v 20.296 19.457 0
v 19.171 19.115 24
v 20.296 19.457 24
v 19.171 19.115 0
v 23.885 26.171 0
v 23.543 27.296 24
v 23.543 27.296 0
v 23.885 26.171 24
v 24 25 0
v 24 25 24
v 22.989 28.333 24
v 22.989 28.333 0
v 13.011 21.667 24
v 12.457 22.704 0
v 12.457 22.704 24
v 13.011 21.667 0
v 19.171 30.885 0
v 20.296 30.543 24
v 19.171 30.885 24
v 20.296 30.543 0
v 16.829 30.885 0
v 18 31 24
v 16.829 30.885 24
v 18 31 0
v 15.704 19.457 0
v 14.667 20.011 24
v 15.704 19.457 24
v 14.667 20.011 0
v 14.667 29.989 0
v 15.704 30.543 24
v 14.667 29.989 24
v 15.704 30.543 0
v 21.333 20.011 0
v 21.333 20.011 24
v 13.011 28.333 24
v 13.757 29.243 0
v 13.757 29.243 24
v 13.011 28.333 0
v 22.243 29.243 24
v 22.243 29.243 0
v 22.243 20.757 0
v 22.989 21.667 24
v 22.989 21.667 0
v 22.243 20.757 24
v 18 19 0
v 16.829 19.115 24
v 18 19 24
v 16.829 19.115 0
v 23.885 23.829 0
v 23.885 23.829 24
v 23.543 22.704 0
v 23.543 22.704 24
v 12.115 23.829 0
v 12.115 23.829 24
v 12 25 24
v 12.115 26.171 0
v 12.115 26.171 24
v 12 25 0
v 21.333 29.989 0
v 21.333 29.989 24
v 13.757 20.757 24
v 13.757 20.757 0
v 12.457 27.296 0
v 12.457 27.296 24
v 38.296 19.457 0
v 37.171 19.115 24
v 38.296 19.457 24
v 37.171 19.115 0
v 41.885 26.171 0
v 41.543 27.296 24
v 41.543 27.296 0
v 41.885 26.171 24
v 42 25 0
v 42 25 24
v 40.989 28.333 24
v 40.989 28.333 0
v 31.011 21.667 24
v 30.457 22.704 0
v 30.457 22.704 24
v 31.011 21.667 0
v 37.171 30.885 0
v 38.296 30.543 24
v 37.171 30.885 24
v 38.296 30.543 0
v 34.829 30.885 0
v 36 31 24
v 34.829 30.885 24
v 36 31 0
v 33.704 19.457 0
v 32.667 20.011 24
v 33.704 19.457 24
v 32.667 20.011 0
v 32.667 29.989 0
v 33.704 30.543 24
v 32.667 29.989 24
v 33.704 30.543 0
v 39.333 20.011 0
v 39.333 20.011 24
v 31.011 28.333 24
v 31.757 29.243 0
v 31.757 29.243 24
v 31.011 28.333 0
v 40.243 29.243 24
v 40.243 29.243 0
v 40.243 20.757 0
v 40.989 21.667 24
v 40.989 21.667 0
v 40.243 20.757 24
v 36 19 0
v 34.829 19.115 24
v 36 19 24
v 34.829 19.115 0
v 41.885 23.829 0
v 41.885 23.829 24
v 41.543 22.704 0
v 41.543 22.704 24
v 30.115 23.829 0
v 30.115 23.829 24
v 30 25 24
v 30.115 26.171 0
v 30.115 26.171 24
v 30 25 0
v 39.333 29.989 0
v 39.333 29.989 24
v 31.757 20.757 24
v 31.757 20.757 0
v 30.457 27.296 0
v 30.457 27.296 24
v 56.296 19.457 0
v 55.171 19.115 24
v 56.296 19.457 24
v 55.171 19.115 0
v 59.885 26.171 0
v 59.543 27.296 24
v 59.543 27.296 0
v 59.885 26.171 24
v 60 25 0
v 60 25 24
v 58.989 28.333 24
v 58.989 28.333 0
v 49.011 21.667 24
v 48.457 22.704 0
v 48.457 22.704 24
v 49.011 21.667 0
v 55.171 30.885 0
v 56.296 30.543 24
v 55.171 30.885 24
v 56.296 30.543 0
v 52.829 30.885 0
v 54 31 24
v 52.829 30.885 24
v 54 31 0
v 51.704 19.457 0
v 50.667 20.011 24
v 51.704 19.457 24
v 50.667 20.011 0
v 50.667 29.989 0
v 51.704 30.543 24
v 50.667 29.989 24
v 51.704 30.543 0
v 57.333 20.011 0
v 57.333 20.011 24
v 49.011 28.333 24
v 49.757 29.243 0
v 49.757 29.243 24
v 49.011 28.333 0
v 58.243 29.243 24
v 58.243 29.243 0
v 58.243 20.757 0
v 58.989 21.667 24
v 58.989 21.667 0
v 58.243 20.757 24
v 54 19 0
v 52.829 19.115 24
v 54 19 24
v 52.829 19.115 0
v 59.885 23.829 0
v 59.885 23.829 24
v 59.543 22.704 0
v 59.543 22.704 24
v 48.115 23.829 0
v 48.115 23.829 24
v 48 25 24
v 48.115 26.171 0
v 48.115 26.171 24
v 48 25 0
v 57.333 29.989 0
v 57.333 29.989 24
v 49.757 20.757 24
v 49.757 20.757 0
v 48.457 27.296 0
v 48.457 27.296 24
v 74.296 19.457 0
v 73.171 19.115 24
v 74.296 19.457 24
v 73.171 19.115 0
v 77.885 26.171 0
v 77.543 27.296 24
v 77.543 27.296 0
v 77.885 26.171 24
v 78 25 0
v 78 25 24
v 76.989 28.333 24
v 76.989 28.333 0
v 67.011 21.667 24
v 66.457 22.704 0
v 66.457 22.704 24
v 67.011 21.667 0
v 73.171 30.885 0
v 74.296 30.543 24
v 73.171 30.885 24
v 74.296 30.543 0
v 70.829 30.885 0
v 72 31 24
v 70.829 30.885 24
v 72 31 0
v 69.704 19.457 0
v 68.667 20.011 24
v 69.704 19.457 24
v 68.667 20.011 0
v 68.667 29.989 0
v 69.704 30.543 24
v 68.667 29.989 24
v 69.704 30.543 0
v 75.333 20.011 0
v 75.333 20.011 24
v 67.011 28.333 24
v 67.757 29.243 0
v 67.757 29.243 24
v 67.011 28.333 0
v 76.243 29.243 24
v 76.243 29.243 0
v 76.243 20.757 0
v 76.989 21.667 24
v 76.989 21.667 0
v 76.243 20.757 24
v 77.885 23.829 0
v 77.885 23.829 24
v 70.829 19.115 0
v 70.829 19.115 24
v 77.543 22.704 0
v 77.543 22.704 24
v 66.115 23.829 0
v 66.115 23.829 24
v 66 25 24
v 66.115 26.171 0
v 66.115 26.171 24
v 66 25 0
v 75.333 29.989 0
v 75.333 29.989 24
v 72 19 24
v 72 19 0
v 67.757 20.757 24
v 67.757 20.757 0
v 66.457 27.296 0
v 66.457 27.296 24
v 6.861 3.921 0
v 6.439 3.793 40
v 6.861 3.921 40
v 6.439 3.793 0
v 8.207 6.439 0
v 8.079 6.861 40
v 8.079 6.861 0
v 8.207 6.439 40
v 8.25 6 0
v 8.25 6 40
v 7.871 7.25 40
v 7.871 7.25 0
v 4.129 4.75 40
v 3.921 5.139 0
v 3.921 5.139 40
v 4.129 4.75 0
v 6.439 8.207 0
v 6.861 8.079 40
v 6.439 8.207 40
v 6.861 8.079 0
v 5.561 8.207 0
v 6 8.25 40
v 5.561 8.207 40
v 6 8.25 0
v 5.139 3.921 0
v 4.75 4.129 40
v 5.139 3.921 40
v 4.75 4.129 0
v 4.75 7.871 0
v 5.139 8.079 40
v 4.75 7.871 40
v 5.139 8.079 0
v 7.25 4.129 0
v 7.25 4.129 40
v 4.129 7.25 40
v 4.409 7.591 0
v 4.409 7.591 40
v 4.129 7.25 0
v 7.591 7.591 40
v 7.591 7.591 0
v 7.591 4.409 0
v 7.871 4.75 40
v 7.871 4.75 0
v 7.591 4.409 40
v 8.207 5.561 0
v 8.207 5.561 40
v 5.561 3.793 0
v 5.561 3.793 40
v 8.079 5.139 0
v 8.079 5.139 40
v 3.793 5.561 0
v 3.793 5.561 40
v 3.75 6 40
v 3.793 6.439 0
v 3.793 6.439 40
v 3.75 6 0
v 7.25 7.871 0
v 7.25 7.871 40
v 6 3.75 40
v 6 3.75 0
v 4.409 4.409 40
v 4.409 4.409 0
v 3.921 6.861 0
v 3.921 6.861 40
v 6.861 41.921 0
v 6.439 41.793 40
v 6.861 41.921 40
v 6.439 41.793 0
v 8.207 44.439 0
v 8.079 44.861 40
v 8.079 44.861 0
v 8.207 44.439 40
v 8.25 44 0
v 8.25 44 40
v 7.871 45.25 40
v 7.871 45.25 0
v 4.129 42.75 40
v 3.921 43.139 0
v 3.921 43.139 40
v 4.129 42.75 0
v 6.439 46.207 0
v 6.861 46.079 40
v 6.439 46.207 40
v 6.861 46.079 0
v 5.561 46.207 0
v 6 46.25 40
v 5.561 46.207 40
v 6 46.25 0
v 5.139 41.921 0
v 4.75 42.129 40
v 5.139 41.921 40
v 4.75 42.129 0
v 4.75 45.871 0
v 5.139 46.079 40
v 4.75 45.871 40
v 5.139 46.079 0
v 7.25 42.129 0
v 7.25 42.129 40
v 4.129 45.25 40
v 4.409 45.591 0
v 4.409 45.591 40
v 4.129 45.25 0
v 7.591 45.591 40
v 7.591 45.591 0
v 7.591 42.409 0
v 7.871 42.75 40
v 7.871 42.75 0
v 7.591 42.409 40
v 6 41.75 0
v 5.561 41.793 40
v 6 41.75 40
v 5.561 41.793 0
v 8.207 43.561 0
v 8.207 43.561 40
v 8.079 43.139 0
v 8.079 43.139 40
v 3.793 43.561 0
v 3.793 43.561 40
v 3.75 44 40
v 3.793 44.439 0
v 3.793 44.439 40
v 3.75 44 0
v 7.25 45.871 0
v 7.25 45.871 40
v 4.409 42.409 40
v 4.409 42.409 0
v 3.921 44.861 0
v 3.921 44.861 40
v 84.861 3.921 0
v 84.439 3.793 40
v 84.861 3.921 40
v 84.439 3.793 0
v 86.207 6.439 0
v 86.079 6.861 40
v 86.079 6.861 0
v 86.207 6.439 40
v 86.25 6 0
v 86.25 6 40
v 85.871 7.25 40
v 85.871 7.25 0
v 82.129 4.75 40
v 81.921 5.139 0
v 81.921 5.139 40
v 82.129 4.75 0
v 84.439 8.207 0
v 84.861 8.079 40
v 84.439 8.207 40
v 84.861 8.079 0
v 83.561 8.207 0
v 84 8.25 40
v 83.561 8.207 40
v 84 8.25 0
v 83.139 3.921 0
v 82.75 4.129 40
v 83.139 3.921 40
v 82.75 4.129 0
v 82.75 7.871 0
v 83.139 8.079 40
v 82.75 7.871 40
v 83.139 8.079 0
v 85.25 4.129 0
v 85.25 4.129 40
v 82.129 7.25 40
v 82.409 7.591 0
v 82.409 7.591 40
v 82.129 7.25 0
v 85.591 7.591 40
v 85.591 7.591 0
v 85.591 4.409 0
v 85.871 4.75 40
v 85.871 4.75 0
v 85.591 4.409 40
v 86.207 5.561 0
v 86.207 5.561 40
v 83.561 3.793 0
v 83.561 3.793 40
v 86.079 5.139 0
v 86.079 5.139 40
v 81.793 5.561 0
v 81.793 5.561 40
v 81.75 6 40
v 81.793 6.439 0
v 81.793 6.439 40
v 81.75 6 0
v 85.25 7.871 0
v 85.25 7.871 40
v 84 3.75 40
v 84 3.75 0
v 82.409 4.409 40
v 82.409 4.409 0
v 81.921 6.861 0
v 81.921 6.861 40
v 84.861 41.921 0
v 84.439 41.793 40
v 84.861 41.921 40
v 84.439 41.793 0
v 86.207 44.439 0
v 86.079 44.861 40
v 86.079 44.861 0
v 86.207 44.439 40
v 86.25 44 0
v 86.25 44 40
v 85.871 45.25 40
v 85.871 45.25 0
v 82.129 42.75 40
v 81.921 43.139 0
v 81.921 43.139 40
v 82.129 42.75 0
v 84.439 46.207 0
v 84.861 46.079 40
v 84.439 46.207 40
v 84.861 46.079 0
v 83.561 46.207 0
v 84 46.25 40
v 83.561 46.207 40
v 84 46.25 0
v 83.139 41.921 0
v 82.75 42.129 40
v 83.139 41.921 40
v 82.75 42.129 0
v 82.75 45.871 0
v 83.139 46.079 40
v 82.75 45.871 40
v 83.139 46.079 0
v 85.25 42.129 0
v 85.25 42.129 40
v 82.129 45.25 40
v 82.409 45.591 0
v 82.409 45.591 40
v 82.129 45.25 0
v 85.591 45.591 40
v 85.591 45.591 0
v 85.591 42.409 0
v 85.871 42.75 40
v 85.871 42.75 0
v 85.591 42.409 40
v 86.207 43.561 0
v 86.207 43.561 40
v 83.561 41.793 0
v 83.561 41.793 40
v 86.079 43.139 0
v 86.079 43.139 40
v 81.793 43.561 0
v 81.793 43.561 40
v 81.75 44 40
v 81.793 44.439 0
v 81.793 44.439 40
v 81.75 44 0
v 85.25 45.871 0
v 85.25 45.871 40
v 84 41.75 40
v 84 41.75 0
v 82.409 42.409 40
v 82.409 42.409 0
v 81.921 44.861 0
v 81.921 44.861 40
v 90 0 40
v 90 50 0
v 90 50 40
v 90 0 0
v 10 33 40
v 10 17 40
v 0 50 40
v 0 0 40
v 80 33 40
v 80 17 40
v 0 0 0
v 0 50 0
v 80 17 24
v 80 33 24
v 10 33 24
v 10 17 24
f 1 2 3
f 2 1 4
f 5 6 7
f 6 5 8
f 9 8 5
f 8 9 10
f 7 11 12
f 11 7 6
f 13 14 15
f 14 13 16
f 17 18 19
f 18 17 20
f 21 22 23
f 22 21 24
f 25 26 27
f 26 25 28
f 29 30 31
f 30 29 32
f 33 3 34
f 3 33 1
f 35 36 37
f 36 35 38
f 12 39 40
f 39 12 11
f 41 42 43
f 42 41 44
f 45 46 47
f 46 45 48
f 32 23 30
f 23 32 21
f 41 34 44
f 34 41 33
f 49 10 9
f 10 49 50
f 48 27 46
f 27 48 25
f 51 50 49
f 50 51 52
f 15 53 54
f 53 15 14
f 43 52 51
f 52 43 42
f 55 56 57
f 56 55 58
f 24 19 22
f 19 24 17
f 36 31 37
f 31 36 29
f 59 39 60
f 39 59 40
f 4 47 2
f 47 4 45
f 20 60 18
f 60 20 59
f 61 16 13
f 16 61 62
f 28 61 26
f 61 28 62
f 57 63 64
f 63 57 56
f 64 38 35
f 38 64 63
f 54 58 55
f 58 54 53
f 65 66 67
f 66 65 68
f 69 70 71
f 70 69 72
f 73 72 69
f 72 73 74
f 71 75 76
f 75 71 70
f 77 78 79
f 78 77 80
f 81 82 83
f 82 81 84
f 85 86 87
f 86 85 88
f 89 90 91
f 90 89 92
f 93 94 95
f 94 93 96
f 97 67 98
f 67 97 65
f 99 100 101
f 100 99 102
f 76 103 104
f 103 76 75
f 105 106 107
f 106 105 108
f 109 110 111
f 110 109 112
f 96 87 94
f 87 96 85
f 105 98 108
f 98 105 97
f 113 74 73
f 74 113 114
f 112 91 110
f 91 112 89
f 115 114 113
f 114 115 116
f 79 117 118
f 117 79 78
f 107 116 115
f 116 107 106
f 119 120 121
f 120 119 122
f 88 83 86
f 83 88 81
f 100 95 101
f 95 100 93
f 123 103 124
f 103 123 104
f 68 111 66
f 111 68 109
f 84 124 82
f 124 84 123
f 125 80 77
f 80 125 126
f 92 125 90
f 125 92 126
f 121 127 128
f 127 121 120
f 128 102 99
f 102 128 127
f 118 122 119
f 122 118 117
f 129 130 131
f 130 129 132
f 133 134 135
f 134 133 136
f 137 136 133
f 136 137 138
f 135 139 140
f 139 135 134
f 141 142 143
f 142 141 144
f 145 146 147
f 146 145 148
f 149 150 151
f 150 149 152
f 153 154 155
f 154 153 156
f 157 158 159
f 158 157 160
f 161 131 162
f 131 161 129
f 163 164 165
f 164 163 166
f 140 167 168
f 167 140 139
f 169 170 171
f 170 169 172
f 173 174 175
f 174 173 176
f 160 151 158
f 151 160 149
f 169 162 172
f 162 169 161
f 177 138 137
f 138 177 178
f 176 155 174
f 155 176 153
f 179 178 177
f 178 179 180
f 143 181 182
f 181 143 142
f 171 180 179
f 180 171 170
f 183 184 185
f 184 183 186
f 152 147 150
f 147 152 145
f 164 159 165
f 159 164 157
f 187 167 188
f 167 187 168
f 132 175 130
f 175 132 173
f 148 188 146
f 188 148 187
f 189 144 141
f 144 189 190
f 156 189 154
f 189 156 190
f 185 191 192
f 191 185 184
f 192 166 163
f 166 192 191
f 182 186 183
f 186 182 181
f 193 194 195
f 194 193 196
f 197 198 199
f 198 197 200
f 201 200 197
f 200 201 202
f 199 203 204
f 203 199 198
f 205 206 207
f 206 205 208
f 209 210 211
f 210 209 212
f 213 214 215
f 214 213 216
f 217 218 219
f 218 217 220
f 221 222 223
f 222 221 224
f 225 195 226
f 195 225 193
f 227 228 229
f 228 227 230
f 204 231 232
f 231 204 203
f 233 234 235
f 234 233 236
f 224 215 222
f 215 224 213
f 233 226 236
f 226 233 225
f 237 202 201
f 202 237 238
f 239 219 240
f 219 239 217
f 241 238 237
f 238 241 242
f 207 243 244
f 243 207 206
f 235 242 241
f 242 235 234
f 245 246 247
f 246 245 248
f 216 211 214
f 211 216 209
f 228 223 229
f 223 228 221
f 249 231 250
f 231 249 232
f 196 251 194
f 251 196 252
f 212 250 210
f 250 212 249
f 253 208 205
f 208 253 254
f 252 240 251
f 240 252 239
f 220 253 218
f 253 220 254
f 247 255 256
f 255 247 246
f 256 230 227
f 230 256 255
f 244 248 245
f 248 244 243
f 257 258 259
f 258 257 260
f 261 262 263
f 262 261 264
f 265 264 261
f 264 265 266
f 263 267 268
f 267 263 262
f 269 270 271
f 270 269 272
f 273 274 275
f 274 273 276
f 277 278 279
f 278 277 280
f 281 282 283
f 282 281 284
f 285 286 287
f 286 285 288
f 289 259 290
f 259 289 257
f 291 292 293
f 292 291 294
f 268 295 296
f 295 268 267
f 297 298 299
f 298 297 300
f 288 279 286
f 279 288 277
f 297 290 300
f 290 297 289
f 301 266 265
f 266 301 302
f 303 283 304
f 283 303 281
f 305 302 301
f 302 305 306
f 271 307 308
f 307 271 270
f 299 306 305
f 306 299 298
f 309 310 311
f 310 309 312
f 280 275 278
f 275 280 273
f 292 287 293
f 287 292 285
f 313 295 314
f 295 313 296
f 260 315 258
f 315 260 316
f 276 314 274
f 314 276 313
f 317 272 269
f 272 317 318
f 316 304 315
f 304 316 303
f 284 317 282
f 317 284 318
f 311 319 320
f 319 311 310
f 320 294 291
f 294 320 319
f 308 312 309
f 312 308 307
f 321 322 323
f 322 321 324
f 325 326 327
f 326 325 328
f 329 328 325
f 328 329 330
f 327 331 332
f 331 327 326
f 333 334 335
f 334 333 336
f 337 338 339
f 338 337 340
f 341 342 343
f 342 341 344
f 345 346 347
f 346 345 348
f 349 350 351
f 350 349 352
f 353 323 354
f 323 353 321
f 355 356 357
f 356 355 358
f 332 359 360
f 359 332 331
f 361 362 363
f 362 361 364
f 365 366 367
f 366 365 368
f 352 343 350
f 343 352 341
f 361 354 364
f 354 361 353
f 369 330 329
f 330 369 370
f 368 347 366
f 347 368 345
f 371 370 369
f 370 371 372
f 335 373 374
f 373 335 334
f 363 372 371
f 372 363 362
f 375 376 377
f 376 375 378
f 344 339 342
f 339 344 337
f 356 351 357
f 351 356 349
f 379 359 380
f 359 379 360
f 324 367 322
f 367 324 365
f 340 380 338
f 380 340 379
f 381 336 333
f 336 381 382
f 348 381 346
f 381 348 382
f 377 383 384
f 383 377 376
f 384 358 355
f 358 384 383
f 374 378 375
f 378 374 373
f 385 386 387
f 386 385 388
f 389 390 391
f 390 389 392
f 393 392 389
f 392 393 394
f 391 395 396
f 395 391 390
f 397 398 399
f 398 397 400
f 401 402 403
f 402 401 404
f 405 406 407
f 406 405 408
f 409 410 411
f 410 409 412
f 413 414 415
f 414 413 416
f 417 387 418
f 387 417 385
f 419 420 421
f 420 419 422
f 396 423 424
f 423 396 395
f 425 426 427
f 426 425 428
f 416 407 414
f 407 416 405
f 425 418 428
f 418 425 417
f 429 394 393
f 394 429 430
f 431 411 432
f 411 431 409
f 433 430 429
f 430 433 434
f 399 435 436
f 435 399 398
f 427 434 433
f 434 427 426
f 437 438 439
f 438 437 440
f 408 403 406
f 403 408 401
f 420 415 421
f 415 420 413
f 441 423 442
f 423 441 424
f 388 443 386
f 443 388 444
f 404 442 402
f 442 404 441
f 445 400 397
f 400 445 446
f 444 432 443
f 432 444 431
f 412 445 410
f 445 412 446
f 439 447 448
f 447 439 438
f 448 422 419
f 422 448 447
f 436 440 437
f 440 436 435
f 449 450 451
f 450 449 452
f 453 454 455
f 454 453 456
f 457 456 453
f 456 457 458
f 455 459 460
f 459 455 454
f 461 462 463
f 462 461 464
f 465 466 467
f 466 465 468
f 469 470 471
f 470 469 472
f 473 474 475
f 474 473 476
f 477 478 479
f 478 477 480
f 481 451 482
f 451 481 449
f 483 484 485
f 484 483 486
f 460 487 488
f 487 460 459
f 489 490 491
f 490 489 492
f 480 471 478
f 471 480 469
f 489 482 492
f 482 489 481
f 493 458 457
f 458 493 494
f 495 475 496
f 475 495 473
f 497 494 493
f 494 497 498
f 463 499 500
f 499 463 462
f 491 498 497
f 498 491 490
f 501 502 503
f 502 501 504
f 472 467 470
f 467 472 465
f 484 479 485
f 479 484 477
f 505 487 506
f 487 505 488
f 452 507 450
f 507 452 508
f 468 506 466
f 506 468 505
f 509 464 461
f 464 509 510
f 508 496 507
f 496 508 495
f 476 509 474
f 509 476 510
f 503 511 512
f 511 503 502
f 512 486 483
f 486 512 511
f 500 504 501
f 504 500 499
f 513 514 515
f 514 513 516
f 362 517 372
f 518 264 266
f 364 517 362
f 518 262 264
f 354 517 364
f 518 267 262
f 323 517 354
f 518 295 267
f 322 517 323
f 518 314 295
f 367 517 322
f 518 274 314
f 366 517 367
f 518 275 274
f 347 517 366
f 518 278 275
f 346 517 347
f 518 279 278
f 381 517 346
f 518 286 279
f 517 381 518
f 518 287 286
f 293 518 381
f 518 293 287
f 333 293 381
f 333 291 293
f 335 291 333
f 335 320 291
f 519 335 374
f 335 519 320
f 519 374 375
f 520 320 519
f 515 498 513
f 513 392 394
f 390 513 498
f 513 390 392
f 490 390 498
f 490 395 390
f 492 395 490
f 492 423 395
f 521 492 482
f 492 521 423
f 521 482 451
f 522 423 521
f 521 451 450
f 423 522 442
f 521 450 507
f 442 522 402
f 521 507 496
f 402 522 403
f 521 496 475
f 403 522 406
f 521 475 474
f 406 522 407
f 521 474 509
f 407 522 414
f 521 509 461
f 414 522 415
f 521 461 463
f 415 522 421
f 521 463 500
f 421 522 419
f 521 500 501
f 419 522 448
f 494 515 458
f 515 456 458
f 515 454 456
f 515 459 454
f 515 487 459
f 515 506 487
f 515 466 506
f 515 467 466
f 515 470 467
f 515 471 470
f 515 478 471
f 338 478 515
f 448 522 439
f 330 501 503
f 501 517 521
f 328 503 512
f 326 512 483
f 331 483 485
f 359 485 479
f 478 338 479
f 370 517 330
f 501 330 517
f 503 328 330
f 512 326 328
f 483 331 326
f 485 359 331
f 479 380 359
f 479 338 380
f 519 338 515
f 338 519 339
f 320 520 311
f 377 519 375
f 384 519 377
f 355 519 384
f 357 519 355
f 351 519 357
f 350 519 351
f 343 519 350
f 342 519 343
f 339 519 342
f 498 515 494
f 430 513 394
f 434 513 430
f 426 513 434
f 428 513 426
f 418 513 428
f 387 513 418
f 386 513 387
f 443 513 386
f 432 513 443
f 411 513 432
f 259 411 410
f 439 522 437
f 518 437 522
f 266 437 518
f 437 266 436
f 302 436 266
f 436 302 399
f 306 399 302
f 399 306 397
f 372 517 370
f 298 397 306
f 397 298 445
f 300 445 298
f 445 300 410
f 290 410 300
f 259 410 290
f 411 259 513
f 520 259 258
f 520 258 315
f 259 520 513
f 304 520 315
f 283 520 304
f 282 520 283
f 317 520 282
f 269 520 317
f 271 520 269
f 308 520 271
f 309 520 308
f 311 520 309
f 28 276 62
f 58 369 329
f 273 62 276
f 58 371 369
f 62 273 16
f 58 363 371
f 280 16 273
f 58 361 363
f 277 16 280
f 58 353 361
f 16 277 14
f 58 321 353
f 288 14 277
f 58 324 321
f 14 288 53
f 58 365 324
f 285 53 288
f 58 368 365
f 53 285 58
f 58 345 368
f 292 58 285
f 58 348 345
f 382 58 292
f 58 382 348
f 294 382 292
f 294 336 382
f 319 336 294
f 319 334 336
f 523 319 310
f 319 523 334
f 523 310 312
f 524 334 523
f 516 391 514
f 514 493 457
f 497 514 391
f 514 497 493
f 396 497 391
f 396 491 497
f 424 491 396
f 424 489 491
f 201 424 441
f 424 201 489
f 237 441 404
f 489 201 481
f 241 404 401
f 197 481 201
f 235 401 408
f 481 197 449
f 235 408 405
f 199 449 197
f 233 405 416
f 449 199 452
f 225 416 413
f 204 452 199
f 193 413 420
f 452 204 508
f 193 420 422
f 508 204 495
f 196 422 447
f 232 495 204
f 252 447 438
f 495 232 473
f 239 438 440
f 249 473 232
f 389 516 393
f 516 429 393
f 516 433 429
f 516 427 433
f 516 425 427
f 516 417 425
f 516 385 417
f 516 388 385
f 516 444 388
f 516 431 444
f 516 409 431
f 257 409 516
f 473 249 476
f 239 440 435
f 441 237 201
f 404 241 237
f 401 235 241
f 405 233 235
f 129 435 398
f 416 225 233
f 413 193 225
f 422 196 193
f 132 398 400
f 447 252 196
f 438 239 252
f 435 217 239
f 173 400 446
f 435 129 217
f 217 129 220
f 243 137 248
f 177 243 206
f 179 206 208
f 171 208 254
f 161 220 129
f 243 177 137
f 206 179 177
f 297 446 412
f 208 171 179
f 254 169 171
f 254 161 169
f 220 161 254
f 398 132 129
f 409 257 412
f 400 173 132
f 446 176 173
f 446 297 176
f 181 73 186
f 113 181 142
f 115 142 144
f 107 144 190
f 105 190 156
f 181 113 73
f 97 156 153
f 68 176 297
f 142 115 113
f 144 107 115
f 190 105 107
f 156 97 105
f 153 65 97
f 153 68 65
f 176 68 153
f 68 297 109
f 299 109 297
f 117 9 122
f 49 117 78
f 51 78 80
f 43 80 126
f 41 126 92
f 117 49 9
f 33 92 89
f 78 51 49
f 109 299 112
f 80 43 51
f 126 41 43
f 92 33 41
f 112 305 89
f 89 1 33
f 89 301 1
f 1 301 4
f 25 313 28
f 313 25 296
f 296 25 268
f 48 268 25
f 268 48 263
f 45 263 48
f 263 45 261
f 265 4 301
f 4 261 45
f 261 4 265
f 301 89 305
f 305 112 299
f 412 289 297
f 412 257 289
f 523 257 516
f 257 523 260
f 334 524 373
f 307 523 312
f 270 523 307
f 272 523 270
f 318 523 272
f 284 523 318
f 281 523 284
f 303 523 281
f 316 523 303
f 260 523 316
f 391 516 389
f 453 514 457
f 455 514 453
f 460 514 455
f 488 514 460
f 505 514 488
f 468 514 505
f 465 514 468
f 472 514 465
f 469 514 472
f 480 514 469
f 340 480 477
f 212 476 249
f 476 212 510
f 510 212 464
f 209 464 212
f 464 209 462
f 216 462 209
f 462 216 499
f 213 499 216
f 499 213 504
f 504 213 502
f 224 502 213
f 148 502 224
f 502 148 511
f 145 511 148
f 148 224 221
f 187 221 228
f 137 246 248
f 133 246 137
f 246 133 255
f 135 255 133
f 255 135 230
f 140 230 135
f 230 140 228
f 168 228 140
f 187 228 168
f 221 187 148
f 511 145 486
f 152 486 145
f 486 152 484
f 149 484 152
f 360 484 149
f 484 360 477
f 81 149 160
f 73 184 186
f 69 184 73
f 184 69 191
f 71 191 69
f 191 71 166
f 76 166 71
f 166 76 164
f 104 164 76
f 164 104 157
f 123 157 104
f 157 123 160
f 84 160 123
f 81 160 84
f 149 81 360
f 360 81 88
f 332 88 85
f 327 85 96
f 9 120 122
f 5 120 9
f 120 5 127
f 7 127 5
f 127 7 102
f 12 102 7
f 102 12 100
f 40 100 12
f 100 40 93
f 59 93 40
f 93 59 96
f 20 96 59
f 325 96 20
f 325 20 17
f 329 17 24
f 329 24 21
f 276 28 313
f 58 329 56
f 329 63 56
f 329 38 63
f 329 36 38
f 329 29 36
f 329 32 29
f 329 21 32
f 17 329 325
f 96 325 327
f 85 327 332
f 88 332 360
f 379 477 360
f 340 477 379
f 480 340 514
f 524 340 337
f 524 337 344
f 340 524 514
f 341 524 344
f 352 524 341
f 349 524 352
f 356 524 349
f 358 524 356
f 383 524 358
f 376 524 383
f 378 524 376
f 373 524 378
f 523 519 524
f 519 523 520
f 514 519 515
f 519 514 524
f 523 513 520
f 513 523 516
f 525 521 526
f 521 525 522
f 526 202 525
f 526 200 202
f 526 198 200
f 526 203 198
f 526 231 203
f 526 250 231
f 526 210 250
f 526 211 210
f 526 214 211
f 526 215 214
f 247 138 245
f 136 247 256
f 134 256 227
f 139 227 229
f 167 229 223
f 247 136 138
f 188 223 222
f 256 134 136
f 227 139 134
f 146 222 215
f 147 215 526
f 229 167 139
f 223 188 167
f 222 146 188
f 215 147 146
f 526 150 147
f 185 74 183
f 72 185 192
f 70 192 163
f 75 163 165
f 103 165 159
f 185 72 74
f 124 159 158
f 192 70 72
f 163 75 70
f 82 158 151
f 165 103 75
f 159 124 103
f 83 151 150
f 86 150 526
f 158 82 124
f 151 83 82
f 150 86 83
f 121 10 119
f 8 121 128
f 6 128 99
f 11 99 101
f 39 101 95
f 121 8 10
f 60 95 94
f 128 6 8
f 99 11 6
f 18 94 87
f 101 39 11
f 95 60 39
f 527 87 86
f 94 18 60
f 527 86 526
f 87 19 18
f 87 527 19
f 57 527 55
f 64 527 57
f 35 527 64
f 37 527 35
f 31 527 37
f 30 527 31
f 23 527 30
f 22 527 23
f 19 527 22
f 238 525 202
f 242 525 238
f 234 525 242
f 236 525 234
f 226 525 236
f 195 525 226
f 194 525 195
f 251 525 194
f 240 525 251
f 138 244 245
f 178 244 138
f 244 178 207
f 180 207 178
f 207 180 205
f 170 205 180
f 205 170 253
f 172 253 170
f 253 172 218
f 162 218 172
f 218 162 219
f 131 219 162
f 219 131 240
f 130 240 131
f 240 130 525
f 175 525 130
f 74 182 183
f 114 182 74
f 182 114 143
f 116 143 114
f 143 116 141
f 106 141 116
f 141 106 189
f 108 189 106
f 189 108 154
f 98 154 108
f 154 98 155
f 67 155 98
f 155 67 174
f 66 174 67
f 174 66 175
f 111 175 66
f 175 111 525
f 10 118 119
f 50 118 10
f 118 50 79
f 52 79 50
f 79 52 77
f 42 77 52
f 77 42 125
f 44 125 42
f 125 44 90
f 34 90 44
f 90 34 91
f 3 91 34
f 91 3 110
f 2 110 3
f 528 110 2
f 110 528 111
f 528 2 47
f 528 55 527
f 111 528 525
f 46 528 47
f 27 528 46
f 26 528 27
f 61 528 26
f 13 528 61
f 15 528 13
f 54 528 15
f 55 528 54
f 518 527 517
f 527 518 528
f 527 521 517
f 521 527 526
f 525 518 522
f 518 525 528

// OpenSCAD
$fn = 32;

// ----------------------------------------------------------------------
// Manifold block: gallery_top manifold
// ----------------------------------------------------------------------

// --- parameters (mm) ---
block_l = 90;             // block length, X
block_w = 50;             // block width, Y
block_h = 40;             // block height, Z
port_d = 12;              // port bore diameter
port_pitch = 18;          // port pitch along X
gallery_d = 16;           // top gallery width, Y
gallery_depth = 16;       // gallery pocket depth
wall_p = 10;              // gallery end wall thickness, X
mnt_d = 4.5;              // mounting hole diameter
mnt_in = 6;               // mounting hole inset from the edges

n_ports = 4;  // ports in the row
port_x0 = (block_l - (n_ports - 1) * port_pitch) / 2;  // first port X

difference() {
  cube([block_l, block_w, block_h]);
  for (i = [0 : n_ports - 1])
    translate([port_x0 + i * port_pitch, block_w / 2, -1])
      cylinder(h = block_h + 2, d = port_d);
  translate([wall_p, block_w / 2 - gallery_d / 2, block_h - gallery_depth])
    cube([block_l - 2 * wall_p, gallery_d, gallery_depth + 1]);
  for (cx = [mnt_in, block_l - mnt_in])
    for (cy = [mnt_in, block_w - mnt_in])
      translate([cx, cy, -1]) cylinder(h = block_h + 2, d = mnt_d);
}
